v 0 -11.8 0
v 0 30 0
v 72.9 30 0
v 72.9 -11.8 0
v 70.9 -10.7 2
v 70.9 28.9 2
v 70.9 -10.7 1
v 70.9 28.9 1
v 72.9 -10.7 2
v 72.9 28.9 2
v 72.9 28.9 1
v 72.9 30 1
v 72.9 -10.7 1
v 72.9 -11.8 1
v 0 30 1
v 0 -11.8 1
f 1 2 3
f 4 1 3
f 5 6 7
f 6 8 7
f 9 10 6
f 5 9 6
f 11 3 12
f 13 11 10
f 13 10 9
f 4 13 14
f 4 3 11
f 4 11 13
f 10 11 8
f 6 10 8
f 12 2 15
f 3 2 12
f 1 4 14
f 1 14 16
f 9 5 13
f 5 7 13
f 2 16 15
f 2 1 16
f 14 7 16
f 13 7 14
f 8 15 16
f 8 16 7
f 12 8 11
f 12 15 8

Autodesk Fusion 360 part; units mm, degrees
sketch "Sketch1" plane through (0, 0, 0) normal (0, 0, 1) x (1, 0, 0)
  line L0 (0, 30) -> (72.9, 30)
  line L1 (72.9, 30) -> (72.9, -11.8)
  line L2 (72.9, -11.8) -> (0, -11.8)
  line L3 (0, -11.8) -> (0, 30)
  dimension "d1" = 72.9
  dimension "d2" = 41.8
extrude "Extrude1" add sketch "Sketch1" along normal blind 1
sketch "Sketch2" plane through (0, 0, 1) normal (0, 0, 1) x (-1, 0, 0)
  line L0 (0, 11.8) -> (-72.9, 11.8)
  line L1 (-72.9, 11.8) -> (-72.9, -30)
  line L2 (-72.9, -30) -> (0, -30)
  line L3 (0, -30) -> (0, 11.8)
  line L4 (0, -9.1) -> (-72.9, -9.1) construction
  line L5 (-72.9, -28.9) -> (-70.9, -28.9)
  line L6 (-70.9, -28.9) -> (-70.9, 10.7)
  line L7 (-70.9, 10.7) -> (-72.9, 10.7)
  line L8 (-72.9, 10.7) -> (-72.9, -28.9)
  dimension "d5" = 39.6
  dimension "d6" = 2
extrude "Extrude2" add sketch "Sketch2" along normal blind 1 contours L1 L5 L6 L7 L8
